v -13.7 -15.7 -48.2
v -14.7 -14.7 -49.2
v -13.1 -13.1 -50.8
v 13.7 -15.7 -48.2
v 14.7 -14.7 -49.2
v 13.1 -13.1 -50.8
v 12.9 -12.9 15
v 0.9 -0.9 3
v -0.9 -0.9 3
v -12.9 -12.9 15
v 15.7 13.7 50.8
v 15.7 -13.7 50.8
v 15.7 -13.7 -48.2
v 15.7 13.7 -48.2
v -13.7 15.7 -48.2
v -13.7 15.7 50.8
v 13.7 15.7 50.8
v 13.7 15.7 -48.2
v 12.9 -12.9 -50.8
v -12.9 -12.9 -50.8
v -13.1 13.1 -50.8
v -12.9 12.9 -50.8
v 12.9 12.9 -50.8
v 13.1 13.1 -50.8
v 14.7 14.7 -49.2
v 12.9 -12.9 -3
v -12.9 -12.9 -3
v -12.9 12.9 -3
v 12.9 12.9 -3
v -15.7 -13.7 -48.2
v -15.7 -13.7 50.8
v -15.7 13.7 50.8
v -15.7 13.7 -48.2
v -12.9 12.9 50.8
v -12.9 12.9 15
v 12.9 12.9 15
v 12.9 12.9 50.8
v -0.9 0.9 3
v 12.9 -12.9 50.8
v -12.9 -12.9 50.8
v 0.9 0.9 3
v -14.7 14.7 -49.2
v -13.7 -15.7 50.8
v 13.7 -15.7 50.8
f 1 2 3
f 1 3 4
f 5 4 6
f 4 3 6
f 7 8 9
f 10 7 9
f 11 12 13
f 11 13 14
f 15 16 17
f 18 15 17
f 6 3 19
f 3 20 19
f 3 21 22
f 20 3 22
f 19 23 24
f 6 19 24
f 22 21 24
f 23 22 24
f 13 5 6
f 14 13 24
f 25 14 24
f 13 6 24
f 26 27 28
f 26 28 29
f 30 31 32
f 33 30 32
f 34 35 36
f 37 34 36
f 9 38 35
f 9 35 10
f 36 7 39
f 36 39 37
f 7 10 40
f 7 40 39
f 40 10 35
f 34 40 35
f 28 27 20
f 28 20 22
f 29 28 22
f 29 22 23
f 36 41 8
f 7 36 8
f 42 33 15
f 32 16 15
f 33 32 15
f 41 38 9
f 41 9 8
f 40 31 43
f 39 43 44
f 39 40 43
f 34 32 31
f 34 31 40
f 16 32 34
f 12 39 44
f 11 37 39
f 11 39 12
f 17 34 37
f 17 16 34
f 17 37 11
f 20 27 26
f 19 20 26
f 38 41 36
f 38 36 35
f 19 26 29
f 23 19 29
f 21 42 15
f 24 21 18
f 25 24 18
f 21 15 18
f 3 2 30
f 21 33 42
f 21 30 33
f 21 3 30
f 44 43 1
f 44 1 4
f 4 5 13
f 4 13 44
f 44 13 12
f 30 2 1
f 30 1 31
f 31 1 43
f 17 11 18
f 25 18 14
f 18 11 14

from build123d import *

# Parameters (mm, degrees)
F0_W          = 31.4
F0_H          = 31.4
F0_W_2        = 25.8
F0_H_2        = 25.8
F1_DEPTH      = 50.8
F1_DEPTH_BACK = 50.8
F2_W          = 28
F2_H          = 28
F3_DEPTH      = 3
F3_DEPTH_BACK = 3
F4_SIZE       = 12
F5_SIZE       = 2
F6_SIZE       = 2.6


with BuildPart() as f1:
    # F0 (on Top) → F1 (new body, two sides)
    with BuildSketch(Plane.XY) as f1_sk:
        Rectangle(F0_W, F0_H)
        Rectangle(F0_W_2, F0_H_2, mode=Mode.SUBTRACT)
    extrude(amount=F1_DEPTH)
    extrude(f1_sk.sketch, amount=-F1_DEPTH_BACK)

    # F2 (on Top) → F3 (join, two sides)
    with BuildSketch(Plane.XY) as f3_sk:
        Rectangle(F2_W, F2_H)
    extrude(amount=F3_DEPTH)
    extrude(f3_sk.sketch, amount=-F3_DEPTH_BACK)

    # F4
    f4_edges = [f1.edges().sort_by_distance(p)[0] for p in [
        (0, 12.9, 3),
        (12.9, 0, 3),
        (0, -12.9, 3),
        (-12.9, 0, 3),
    ]]
    chamfer(f4_edges, length=F4_SIZE)

    # F5
    f5_edges = [f1.edges().sort_by_distance(p)[0] for p in [
        (15.7, -15.7, 0),
        (-15.7, -15.7, 0),
        (15.7, 15.7, 0),
        (-15.7, 15.7, 0),
    ]]
    chamfer(f5_edges, length=F5_SIZE)

    # F6 (call 1 of 4: OpenCascade refuses the feature's edges together)
    f6_edges = [f1.edges().sort_by_distance(p)[0] for p in [
        (15.7, 0, -50.8),
    ]]
    chamfer(f6_edges, length=F6_SIZE)

    # F6#2 (call 2 of 4)
    f6_2_edges = [f1.edges().sort_by_distance(p)[0] for p in [
        (0, -15.7, -50.8),
    ]]
    chamfer(f6_2_edges, length=F6_SIZE)

    # F6#3 (call 3 of 4)
    f6_3_edges = [f1.edges().sort_by_distance(p)[0] for p in [
        (-15.7, 0, -50.8),
    ]]
    chamfer(f6_3_edges, length=F6_SIZE)

    # F6#4 (call 4 of 4)
    f6_4_edges = [f1.edges().sort_by_distance(p)[0] for p in [
        (0, 15.7, -50.8),
    ]]
    chamfer(f6_4_edges, length=F6_SIZE)


solid = f1.part
